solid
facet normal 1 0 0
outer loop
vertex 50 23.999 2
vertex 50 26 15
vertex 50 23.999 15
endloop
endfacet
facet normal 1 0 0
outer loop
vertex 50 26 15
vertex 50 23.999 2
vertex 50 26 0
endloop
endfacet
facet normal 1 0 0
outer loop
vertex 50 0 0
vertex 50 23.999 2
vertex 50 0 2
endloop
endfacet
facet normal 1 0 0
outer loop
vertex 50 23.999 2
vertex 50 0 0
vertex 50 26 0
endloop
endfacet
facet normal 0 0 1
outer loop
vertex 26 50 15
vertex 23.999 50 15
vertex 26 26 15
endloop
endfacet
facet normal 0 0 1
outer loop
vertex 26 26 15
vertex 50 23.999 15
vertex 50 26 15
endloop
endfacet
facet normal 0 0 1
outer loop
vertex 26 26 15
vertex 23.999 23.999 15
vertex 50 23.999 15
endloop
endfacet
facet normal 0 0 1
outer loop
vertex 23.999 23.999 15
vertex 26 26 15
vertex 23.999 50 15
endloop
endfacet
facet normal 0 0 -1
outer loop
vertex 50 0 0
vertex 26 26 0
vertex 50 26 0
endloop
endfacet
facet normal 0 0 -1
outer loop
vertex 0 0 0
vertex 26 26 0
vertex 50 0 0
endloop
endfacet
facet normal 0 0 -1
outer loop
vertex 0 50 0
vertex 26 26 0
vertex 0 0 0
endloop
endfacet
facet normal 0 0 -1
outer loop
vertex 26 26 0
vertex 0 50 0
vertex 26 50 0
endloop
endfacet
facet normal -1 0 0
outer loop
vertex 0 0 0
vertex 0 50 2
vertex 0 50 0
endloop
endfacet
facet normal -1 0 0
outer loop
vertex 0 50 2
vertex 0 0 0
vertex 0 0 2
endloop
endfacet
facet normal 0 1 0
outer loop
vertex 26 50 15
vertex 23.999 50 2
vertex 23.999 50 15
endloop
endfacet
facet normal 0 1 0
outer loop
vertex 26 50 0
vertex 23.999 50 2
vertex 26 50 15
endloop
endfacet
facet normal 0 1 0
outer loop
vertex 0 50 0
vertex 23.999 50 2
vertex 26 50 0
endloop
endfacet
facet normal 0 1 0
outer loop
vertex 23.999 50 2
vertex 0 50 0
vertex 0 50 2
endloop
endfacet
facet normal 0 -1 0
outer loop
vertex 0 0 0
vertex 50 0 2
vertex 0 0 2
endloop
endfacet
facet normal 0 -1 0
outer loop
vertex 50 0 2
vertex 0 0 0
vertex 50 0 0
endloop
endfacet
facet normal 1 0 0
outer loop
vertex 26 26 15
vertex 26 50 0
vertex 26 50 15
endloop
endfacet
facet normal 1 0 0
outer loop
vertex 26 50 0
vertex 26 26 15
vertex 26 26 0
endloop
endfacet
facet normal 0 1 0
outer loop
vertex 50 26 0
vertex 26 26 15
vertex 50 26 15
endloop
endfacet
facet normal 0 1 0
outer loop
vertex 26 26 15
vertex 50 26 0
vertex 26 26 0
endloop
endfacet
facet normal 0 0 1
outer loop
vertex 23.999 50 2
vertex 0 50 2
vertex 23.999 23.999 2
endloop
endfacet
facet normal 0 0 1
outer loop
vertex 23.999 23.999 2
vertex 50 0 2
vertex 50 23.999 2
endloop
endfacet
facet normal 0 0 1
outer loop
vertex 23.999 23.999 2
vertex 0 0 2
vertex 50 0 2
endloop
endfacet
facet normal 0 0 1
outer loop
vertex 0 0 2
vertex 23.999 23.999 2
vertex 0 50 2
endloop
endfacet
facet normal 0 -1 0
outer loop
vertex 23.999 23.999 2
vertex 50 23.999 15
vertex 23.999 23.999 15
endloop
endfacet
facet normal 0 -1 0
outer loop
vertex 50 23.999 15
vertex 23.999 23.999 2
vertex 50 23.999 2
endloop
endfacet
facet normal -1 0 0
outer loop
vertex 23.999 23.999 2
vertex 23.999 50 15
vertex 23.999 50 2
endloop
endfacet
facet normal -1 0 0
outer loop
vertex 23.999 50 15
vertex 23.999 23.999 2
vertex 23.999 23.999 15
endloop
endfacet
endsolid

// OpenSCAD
module esquina() {
    difference() {
        cube([50, 50, 13 + 2]);
        translate([24 + 2, 24 + 2, -0.001]) cube([50, 50, 13 + 2 + 0.002]);
        translate([2, 2, 2]) cube([50, 50, 13 + 2]);
    }
  
}

module esquina2() {
    difference() {
        cube([50, 50, 13 + 2]);
        translate([24 + 2, 24 + 2, -0.001]) cube([50, 50, 13 + 2 + 0.002]);
        translate([0,-0.001,2]) cube([50 + 0.001, 24, 13 + 2]);
        translate([-0.001,0,2]) cube([24, 50 + 0.001, 13 + 2]);
    }
  
}

esquina2();
